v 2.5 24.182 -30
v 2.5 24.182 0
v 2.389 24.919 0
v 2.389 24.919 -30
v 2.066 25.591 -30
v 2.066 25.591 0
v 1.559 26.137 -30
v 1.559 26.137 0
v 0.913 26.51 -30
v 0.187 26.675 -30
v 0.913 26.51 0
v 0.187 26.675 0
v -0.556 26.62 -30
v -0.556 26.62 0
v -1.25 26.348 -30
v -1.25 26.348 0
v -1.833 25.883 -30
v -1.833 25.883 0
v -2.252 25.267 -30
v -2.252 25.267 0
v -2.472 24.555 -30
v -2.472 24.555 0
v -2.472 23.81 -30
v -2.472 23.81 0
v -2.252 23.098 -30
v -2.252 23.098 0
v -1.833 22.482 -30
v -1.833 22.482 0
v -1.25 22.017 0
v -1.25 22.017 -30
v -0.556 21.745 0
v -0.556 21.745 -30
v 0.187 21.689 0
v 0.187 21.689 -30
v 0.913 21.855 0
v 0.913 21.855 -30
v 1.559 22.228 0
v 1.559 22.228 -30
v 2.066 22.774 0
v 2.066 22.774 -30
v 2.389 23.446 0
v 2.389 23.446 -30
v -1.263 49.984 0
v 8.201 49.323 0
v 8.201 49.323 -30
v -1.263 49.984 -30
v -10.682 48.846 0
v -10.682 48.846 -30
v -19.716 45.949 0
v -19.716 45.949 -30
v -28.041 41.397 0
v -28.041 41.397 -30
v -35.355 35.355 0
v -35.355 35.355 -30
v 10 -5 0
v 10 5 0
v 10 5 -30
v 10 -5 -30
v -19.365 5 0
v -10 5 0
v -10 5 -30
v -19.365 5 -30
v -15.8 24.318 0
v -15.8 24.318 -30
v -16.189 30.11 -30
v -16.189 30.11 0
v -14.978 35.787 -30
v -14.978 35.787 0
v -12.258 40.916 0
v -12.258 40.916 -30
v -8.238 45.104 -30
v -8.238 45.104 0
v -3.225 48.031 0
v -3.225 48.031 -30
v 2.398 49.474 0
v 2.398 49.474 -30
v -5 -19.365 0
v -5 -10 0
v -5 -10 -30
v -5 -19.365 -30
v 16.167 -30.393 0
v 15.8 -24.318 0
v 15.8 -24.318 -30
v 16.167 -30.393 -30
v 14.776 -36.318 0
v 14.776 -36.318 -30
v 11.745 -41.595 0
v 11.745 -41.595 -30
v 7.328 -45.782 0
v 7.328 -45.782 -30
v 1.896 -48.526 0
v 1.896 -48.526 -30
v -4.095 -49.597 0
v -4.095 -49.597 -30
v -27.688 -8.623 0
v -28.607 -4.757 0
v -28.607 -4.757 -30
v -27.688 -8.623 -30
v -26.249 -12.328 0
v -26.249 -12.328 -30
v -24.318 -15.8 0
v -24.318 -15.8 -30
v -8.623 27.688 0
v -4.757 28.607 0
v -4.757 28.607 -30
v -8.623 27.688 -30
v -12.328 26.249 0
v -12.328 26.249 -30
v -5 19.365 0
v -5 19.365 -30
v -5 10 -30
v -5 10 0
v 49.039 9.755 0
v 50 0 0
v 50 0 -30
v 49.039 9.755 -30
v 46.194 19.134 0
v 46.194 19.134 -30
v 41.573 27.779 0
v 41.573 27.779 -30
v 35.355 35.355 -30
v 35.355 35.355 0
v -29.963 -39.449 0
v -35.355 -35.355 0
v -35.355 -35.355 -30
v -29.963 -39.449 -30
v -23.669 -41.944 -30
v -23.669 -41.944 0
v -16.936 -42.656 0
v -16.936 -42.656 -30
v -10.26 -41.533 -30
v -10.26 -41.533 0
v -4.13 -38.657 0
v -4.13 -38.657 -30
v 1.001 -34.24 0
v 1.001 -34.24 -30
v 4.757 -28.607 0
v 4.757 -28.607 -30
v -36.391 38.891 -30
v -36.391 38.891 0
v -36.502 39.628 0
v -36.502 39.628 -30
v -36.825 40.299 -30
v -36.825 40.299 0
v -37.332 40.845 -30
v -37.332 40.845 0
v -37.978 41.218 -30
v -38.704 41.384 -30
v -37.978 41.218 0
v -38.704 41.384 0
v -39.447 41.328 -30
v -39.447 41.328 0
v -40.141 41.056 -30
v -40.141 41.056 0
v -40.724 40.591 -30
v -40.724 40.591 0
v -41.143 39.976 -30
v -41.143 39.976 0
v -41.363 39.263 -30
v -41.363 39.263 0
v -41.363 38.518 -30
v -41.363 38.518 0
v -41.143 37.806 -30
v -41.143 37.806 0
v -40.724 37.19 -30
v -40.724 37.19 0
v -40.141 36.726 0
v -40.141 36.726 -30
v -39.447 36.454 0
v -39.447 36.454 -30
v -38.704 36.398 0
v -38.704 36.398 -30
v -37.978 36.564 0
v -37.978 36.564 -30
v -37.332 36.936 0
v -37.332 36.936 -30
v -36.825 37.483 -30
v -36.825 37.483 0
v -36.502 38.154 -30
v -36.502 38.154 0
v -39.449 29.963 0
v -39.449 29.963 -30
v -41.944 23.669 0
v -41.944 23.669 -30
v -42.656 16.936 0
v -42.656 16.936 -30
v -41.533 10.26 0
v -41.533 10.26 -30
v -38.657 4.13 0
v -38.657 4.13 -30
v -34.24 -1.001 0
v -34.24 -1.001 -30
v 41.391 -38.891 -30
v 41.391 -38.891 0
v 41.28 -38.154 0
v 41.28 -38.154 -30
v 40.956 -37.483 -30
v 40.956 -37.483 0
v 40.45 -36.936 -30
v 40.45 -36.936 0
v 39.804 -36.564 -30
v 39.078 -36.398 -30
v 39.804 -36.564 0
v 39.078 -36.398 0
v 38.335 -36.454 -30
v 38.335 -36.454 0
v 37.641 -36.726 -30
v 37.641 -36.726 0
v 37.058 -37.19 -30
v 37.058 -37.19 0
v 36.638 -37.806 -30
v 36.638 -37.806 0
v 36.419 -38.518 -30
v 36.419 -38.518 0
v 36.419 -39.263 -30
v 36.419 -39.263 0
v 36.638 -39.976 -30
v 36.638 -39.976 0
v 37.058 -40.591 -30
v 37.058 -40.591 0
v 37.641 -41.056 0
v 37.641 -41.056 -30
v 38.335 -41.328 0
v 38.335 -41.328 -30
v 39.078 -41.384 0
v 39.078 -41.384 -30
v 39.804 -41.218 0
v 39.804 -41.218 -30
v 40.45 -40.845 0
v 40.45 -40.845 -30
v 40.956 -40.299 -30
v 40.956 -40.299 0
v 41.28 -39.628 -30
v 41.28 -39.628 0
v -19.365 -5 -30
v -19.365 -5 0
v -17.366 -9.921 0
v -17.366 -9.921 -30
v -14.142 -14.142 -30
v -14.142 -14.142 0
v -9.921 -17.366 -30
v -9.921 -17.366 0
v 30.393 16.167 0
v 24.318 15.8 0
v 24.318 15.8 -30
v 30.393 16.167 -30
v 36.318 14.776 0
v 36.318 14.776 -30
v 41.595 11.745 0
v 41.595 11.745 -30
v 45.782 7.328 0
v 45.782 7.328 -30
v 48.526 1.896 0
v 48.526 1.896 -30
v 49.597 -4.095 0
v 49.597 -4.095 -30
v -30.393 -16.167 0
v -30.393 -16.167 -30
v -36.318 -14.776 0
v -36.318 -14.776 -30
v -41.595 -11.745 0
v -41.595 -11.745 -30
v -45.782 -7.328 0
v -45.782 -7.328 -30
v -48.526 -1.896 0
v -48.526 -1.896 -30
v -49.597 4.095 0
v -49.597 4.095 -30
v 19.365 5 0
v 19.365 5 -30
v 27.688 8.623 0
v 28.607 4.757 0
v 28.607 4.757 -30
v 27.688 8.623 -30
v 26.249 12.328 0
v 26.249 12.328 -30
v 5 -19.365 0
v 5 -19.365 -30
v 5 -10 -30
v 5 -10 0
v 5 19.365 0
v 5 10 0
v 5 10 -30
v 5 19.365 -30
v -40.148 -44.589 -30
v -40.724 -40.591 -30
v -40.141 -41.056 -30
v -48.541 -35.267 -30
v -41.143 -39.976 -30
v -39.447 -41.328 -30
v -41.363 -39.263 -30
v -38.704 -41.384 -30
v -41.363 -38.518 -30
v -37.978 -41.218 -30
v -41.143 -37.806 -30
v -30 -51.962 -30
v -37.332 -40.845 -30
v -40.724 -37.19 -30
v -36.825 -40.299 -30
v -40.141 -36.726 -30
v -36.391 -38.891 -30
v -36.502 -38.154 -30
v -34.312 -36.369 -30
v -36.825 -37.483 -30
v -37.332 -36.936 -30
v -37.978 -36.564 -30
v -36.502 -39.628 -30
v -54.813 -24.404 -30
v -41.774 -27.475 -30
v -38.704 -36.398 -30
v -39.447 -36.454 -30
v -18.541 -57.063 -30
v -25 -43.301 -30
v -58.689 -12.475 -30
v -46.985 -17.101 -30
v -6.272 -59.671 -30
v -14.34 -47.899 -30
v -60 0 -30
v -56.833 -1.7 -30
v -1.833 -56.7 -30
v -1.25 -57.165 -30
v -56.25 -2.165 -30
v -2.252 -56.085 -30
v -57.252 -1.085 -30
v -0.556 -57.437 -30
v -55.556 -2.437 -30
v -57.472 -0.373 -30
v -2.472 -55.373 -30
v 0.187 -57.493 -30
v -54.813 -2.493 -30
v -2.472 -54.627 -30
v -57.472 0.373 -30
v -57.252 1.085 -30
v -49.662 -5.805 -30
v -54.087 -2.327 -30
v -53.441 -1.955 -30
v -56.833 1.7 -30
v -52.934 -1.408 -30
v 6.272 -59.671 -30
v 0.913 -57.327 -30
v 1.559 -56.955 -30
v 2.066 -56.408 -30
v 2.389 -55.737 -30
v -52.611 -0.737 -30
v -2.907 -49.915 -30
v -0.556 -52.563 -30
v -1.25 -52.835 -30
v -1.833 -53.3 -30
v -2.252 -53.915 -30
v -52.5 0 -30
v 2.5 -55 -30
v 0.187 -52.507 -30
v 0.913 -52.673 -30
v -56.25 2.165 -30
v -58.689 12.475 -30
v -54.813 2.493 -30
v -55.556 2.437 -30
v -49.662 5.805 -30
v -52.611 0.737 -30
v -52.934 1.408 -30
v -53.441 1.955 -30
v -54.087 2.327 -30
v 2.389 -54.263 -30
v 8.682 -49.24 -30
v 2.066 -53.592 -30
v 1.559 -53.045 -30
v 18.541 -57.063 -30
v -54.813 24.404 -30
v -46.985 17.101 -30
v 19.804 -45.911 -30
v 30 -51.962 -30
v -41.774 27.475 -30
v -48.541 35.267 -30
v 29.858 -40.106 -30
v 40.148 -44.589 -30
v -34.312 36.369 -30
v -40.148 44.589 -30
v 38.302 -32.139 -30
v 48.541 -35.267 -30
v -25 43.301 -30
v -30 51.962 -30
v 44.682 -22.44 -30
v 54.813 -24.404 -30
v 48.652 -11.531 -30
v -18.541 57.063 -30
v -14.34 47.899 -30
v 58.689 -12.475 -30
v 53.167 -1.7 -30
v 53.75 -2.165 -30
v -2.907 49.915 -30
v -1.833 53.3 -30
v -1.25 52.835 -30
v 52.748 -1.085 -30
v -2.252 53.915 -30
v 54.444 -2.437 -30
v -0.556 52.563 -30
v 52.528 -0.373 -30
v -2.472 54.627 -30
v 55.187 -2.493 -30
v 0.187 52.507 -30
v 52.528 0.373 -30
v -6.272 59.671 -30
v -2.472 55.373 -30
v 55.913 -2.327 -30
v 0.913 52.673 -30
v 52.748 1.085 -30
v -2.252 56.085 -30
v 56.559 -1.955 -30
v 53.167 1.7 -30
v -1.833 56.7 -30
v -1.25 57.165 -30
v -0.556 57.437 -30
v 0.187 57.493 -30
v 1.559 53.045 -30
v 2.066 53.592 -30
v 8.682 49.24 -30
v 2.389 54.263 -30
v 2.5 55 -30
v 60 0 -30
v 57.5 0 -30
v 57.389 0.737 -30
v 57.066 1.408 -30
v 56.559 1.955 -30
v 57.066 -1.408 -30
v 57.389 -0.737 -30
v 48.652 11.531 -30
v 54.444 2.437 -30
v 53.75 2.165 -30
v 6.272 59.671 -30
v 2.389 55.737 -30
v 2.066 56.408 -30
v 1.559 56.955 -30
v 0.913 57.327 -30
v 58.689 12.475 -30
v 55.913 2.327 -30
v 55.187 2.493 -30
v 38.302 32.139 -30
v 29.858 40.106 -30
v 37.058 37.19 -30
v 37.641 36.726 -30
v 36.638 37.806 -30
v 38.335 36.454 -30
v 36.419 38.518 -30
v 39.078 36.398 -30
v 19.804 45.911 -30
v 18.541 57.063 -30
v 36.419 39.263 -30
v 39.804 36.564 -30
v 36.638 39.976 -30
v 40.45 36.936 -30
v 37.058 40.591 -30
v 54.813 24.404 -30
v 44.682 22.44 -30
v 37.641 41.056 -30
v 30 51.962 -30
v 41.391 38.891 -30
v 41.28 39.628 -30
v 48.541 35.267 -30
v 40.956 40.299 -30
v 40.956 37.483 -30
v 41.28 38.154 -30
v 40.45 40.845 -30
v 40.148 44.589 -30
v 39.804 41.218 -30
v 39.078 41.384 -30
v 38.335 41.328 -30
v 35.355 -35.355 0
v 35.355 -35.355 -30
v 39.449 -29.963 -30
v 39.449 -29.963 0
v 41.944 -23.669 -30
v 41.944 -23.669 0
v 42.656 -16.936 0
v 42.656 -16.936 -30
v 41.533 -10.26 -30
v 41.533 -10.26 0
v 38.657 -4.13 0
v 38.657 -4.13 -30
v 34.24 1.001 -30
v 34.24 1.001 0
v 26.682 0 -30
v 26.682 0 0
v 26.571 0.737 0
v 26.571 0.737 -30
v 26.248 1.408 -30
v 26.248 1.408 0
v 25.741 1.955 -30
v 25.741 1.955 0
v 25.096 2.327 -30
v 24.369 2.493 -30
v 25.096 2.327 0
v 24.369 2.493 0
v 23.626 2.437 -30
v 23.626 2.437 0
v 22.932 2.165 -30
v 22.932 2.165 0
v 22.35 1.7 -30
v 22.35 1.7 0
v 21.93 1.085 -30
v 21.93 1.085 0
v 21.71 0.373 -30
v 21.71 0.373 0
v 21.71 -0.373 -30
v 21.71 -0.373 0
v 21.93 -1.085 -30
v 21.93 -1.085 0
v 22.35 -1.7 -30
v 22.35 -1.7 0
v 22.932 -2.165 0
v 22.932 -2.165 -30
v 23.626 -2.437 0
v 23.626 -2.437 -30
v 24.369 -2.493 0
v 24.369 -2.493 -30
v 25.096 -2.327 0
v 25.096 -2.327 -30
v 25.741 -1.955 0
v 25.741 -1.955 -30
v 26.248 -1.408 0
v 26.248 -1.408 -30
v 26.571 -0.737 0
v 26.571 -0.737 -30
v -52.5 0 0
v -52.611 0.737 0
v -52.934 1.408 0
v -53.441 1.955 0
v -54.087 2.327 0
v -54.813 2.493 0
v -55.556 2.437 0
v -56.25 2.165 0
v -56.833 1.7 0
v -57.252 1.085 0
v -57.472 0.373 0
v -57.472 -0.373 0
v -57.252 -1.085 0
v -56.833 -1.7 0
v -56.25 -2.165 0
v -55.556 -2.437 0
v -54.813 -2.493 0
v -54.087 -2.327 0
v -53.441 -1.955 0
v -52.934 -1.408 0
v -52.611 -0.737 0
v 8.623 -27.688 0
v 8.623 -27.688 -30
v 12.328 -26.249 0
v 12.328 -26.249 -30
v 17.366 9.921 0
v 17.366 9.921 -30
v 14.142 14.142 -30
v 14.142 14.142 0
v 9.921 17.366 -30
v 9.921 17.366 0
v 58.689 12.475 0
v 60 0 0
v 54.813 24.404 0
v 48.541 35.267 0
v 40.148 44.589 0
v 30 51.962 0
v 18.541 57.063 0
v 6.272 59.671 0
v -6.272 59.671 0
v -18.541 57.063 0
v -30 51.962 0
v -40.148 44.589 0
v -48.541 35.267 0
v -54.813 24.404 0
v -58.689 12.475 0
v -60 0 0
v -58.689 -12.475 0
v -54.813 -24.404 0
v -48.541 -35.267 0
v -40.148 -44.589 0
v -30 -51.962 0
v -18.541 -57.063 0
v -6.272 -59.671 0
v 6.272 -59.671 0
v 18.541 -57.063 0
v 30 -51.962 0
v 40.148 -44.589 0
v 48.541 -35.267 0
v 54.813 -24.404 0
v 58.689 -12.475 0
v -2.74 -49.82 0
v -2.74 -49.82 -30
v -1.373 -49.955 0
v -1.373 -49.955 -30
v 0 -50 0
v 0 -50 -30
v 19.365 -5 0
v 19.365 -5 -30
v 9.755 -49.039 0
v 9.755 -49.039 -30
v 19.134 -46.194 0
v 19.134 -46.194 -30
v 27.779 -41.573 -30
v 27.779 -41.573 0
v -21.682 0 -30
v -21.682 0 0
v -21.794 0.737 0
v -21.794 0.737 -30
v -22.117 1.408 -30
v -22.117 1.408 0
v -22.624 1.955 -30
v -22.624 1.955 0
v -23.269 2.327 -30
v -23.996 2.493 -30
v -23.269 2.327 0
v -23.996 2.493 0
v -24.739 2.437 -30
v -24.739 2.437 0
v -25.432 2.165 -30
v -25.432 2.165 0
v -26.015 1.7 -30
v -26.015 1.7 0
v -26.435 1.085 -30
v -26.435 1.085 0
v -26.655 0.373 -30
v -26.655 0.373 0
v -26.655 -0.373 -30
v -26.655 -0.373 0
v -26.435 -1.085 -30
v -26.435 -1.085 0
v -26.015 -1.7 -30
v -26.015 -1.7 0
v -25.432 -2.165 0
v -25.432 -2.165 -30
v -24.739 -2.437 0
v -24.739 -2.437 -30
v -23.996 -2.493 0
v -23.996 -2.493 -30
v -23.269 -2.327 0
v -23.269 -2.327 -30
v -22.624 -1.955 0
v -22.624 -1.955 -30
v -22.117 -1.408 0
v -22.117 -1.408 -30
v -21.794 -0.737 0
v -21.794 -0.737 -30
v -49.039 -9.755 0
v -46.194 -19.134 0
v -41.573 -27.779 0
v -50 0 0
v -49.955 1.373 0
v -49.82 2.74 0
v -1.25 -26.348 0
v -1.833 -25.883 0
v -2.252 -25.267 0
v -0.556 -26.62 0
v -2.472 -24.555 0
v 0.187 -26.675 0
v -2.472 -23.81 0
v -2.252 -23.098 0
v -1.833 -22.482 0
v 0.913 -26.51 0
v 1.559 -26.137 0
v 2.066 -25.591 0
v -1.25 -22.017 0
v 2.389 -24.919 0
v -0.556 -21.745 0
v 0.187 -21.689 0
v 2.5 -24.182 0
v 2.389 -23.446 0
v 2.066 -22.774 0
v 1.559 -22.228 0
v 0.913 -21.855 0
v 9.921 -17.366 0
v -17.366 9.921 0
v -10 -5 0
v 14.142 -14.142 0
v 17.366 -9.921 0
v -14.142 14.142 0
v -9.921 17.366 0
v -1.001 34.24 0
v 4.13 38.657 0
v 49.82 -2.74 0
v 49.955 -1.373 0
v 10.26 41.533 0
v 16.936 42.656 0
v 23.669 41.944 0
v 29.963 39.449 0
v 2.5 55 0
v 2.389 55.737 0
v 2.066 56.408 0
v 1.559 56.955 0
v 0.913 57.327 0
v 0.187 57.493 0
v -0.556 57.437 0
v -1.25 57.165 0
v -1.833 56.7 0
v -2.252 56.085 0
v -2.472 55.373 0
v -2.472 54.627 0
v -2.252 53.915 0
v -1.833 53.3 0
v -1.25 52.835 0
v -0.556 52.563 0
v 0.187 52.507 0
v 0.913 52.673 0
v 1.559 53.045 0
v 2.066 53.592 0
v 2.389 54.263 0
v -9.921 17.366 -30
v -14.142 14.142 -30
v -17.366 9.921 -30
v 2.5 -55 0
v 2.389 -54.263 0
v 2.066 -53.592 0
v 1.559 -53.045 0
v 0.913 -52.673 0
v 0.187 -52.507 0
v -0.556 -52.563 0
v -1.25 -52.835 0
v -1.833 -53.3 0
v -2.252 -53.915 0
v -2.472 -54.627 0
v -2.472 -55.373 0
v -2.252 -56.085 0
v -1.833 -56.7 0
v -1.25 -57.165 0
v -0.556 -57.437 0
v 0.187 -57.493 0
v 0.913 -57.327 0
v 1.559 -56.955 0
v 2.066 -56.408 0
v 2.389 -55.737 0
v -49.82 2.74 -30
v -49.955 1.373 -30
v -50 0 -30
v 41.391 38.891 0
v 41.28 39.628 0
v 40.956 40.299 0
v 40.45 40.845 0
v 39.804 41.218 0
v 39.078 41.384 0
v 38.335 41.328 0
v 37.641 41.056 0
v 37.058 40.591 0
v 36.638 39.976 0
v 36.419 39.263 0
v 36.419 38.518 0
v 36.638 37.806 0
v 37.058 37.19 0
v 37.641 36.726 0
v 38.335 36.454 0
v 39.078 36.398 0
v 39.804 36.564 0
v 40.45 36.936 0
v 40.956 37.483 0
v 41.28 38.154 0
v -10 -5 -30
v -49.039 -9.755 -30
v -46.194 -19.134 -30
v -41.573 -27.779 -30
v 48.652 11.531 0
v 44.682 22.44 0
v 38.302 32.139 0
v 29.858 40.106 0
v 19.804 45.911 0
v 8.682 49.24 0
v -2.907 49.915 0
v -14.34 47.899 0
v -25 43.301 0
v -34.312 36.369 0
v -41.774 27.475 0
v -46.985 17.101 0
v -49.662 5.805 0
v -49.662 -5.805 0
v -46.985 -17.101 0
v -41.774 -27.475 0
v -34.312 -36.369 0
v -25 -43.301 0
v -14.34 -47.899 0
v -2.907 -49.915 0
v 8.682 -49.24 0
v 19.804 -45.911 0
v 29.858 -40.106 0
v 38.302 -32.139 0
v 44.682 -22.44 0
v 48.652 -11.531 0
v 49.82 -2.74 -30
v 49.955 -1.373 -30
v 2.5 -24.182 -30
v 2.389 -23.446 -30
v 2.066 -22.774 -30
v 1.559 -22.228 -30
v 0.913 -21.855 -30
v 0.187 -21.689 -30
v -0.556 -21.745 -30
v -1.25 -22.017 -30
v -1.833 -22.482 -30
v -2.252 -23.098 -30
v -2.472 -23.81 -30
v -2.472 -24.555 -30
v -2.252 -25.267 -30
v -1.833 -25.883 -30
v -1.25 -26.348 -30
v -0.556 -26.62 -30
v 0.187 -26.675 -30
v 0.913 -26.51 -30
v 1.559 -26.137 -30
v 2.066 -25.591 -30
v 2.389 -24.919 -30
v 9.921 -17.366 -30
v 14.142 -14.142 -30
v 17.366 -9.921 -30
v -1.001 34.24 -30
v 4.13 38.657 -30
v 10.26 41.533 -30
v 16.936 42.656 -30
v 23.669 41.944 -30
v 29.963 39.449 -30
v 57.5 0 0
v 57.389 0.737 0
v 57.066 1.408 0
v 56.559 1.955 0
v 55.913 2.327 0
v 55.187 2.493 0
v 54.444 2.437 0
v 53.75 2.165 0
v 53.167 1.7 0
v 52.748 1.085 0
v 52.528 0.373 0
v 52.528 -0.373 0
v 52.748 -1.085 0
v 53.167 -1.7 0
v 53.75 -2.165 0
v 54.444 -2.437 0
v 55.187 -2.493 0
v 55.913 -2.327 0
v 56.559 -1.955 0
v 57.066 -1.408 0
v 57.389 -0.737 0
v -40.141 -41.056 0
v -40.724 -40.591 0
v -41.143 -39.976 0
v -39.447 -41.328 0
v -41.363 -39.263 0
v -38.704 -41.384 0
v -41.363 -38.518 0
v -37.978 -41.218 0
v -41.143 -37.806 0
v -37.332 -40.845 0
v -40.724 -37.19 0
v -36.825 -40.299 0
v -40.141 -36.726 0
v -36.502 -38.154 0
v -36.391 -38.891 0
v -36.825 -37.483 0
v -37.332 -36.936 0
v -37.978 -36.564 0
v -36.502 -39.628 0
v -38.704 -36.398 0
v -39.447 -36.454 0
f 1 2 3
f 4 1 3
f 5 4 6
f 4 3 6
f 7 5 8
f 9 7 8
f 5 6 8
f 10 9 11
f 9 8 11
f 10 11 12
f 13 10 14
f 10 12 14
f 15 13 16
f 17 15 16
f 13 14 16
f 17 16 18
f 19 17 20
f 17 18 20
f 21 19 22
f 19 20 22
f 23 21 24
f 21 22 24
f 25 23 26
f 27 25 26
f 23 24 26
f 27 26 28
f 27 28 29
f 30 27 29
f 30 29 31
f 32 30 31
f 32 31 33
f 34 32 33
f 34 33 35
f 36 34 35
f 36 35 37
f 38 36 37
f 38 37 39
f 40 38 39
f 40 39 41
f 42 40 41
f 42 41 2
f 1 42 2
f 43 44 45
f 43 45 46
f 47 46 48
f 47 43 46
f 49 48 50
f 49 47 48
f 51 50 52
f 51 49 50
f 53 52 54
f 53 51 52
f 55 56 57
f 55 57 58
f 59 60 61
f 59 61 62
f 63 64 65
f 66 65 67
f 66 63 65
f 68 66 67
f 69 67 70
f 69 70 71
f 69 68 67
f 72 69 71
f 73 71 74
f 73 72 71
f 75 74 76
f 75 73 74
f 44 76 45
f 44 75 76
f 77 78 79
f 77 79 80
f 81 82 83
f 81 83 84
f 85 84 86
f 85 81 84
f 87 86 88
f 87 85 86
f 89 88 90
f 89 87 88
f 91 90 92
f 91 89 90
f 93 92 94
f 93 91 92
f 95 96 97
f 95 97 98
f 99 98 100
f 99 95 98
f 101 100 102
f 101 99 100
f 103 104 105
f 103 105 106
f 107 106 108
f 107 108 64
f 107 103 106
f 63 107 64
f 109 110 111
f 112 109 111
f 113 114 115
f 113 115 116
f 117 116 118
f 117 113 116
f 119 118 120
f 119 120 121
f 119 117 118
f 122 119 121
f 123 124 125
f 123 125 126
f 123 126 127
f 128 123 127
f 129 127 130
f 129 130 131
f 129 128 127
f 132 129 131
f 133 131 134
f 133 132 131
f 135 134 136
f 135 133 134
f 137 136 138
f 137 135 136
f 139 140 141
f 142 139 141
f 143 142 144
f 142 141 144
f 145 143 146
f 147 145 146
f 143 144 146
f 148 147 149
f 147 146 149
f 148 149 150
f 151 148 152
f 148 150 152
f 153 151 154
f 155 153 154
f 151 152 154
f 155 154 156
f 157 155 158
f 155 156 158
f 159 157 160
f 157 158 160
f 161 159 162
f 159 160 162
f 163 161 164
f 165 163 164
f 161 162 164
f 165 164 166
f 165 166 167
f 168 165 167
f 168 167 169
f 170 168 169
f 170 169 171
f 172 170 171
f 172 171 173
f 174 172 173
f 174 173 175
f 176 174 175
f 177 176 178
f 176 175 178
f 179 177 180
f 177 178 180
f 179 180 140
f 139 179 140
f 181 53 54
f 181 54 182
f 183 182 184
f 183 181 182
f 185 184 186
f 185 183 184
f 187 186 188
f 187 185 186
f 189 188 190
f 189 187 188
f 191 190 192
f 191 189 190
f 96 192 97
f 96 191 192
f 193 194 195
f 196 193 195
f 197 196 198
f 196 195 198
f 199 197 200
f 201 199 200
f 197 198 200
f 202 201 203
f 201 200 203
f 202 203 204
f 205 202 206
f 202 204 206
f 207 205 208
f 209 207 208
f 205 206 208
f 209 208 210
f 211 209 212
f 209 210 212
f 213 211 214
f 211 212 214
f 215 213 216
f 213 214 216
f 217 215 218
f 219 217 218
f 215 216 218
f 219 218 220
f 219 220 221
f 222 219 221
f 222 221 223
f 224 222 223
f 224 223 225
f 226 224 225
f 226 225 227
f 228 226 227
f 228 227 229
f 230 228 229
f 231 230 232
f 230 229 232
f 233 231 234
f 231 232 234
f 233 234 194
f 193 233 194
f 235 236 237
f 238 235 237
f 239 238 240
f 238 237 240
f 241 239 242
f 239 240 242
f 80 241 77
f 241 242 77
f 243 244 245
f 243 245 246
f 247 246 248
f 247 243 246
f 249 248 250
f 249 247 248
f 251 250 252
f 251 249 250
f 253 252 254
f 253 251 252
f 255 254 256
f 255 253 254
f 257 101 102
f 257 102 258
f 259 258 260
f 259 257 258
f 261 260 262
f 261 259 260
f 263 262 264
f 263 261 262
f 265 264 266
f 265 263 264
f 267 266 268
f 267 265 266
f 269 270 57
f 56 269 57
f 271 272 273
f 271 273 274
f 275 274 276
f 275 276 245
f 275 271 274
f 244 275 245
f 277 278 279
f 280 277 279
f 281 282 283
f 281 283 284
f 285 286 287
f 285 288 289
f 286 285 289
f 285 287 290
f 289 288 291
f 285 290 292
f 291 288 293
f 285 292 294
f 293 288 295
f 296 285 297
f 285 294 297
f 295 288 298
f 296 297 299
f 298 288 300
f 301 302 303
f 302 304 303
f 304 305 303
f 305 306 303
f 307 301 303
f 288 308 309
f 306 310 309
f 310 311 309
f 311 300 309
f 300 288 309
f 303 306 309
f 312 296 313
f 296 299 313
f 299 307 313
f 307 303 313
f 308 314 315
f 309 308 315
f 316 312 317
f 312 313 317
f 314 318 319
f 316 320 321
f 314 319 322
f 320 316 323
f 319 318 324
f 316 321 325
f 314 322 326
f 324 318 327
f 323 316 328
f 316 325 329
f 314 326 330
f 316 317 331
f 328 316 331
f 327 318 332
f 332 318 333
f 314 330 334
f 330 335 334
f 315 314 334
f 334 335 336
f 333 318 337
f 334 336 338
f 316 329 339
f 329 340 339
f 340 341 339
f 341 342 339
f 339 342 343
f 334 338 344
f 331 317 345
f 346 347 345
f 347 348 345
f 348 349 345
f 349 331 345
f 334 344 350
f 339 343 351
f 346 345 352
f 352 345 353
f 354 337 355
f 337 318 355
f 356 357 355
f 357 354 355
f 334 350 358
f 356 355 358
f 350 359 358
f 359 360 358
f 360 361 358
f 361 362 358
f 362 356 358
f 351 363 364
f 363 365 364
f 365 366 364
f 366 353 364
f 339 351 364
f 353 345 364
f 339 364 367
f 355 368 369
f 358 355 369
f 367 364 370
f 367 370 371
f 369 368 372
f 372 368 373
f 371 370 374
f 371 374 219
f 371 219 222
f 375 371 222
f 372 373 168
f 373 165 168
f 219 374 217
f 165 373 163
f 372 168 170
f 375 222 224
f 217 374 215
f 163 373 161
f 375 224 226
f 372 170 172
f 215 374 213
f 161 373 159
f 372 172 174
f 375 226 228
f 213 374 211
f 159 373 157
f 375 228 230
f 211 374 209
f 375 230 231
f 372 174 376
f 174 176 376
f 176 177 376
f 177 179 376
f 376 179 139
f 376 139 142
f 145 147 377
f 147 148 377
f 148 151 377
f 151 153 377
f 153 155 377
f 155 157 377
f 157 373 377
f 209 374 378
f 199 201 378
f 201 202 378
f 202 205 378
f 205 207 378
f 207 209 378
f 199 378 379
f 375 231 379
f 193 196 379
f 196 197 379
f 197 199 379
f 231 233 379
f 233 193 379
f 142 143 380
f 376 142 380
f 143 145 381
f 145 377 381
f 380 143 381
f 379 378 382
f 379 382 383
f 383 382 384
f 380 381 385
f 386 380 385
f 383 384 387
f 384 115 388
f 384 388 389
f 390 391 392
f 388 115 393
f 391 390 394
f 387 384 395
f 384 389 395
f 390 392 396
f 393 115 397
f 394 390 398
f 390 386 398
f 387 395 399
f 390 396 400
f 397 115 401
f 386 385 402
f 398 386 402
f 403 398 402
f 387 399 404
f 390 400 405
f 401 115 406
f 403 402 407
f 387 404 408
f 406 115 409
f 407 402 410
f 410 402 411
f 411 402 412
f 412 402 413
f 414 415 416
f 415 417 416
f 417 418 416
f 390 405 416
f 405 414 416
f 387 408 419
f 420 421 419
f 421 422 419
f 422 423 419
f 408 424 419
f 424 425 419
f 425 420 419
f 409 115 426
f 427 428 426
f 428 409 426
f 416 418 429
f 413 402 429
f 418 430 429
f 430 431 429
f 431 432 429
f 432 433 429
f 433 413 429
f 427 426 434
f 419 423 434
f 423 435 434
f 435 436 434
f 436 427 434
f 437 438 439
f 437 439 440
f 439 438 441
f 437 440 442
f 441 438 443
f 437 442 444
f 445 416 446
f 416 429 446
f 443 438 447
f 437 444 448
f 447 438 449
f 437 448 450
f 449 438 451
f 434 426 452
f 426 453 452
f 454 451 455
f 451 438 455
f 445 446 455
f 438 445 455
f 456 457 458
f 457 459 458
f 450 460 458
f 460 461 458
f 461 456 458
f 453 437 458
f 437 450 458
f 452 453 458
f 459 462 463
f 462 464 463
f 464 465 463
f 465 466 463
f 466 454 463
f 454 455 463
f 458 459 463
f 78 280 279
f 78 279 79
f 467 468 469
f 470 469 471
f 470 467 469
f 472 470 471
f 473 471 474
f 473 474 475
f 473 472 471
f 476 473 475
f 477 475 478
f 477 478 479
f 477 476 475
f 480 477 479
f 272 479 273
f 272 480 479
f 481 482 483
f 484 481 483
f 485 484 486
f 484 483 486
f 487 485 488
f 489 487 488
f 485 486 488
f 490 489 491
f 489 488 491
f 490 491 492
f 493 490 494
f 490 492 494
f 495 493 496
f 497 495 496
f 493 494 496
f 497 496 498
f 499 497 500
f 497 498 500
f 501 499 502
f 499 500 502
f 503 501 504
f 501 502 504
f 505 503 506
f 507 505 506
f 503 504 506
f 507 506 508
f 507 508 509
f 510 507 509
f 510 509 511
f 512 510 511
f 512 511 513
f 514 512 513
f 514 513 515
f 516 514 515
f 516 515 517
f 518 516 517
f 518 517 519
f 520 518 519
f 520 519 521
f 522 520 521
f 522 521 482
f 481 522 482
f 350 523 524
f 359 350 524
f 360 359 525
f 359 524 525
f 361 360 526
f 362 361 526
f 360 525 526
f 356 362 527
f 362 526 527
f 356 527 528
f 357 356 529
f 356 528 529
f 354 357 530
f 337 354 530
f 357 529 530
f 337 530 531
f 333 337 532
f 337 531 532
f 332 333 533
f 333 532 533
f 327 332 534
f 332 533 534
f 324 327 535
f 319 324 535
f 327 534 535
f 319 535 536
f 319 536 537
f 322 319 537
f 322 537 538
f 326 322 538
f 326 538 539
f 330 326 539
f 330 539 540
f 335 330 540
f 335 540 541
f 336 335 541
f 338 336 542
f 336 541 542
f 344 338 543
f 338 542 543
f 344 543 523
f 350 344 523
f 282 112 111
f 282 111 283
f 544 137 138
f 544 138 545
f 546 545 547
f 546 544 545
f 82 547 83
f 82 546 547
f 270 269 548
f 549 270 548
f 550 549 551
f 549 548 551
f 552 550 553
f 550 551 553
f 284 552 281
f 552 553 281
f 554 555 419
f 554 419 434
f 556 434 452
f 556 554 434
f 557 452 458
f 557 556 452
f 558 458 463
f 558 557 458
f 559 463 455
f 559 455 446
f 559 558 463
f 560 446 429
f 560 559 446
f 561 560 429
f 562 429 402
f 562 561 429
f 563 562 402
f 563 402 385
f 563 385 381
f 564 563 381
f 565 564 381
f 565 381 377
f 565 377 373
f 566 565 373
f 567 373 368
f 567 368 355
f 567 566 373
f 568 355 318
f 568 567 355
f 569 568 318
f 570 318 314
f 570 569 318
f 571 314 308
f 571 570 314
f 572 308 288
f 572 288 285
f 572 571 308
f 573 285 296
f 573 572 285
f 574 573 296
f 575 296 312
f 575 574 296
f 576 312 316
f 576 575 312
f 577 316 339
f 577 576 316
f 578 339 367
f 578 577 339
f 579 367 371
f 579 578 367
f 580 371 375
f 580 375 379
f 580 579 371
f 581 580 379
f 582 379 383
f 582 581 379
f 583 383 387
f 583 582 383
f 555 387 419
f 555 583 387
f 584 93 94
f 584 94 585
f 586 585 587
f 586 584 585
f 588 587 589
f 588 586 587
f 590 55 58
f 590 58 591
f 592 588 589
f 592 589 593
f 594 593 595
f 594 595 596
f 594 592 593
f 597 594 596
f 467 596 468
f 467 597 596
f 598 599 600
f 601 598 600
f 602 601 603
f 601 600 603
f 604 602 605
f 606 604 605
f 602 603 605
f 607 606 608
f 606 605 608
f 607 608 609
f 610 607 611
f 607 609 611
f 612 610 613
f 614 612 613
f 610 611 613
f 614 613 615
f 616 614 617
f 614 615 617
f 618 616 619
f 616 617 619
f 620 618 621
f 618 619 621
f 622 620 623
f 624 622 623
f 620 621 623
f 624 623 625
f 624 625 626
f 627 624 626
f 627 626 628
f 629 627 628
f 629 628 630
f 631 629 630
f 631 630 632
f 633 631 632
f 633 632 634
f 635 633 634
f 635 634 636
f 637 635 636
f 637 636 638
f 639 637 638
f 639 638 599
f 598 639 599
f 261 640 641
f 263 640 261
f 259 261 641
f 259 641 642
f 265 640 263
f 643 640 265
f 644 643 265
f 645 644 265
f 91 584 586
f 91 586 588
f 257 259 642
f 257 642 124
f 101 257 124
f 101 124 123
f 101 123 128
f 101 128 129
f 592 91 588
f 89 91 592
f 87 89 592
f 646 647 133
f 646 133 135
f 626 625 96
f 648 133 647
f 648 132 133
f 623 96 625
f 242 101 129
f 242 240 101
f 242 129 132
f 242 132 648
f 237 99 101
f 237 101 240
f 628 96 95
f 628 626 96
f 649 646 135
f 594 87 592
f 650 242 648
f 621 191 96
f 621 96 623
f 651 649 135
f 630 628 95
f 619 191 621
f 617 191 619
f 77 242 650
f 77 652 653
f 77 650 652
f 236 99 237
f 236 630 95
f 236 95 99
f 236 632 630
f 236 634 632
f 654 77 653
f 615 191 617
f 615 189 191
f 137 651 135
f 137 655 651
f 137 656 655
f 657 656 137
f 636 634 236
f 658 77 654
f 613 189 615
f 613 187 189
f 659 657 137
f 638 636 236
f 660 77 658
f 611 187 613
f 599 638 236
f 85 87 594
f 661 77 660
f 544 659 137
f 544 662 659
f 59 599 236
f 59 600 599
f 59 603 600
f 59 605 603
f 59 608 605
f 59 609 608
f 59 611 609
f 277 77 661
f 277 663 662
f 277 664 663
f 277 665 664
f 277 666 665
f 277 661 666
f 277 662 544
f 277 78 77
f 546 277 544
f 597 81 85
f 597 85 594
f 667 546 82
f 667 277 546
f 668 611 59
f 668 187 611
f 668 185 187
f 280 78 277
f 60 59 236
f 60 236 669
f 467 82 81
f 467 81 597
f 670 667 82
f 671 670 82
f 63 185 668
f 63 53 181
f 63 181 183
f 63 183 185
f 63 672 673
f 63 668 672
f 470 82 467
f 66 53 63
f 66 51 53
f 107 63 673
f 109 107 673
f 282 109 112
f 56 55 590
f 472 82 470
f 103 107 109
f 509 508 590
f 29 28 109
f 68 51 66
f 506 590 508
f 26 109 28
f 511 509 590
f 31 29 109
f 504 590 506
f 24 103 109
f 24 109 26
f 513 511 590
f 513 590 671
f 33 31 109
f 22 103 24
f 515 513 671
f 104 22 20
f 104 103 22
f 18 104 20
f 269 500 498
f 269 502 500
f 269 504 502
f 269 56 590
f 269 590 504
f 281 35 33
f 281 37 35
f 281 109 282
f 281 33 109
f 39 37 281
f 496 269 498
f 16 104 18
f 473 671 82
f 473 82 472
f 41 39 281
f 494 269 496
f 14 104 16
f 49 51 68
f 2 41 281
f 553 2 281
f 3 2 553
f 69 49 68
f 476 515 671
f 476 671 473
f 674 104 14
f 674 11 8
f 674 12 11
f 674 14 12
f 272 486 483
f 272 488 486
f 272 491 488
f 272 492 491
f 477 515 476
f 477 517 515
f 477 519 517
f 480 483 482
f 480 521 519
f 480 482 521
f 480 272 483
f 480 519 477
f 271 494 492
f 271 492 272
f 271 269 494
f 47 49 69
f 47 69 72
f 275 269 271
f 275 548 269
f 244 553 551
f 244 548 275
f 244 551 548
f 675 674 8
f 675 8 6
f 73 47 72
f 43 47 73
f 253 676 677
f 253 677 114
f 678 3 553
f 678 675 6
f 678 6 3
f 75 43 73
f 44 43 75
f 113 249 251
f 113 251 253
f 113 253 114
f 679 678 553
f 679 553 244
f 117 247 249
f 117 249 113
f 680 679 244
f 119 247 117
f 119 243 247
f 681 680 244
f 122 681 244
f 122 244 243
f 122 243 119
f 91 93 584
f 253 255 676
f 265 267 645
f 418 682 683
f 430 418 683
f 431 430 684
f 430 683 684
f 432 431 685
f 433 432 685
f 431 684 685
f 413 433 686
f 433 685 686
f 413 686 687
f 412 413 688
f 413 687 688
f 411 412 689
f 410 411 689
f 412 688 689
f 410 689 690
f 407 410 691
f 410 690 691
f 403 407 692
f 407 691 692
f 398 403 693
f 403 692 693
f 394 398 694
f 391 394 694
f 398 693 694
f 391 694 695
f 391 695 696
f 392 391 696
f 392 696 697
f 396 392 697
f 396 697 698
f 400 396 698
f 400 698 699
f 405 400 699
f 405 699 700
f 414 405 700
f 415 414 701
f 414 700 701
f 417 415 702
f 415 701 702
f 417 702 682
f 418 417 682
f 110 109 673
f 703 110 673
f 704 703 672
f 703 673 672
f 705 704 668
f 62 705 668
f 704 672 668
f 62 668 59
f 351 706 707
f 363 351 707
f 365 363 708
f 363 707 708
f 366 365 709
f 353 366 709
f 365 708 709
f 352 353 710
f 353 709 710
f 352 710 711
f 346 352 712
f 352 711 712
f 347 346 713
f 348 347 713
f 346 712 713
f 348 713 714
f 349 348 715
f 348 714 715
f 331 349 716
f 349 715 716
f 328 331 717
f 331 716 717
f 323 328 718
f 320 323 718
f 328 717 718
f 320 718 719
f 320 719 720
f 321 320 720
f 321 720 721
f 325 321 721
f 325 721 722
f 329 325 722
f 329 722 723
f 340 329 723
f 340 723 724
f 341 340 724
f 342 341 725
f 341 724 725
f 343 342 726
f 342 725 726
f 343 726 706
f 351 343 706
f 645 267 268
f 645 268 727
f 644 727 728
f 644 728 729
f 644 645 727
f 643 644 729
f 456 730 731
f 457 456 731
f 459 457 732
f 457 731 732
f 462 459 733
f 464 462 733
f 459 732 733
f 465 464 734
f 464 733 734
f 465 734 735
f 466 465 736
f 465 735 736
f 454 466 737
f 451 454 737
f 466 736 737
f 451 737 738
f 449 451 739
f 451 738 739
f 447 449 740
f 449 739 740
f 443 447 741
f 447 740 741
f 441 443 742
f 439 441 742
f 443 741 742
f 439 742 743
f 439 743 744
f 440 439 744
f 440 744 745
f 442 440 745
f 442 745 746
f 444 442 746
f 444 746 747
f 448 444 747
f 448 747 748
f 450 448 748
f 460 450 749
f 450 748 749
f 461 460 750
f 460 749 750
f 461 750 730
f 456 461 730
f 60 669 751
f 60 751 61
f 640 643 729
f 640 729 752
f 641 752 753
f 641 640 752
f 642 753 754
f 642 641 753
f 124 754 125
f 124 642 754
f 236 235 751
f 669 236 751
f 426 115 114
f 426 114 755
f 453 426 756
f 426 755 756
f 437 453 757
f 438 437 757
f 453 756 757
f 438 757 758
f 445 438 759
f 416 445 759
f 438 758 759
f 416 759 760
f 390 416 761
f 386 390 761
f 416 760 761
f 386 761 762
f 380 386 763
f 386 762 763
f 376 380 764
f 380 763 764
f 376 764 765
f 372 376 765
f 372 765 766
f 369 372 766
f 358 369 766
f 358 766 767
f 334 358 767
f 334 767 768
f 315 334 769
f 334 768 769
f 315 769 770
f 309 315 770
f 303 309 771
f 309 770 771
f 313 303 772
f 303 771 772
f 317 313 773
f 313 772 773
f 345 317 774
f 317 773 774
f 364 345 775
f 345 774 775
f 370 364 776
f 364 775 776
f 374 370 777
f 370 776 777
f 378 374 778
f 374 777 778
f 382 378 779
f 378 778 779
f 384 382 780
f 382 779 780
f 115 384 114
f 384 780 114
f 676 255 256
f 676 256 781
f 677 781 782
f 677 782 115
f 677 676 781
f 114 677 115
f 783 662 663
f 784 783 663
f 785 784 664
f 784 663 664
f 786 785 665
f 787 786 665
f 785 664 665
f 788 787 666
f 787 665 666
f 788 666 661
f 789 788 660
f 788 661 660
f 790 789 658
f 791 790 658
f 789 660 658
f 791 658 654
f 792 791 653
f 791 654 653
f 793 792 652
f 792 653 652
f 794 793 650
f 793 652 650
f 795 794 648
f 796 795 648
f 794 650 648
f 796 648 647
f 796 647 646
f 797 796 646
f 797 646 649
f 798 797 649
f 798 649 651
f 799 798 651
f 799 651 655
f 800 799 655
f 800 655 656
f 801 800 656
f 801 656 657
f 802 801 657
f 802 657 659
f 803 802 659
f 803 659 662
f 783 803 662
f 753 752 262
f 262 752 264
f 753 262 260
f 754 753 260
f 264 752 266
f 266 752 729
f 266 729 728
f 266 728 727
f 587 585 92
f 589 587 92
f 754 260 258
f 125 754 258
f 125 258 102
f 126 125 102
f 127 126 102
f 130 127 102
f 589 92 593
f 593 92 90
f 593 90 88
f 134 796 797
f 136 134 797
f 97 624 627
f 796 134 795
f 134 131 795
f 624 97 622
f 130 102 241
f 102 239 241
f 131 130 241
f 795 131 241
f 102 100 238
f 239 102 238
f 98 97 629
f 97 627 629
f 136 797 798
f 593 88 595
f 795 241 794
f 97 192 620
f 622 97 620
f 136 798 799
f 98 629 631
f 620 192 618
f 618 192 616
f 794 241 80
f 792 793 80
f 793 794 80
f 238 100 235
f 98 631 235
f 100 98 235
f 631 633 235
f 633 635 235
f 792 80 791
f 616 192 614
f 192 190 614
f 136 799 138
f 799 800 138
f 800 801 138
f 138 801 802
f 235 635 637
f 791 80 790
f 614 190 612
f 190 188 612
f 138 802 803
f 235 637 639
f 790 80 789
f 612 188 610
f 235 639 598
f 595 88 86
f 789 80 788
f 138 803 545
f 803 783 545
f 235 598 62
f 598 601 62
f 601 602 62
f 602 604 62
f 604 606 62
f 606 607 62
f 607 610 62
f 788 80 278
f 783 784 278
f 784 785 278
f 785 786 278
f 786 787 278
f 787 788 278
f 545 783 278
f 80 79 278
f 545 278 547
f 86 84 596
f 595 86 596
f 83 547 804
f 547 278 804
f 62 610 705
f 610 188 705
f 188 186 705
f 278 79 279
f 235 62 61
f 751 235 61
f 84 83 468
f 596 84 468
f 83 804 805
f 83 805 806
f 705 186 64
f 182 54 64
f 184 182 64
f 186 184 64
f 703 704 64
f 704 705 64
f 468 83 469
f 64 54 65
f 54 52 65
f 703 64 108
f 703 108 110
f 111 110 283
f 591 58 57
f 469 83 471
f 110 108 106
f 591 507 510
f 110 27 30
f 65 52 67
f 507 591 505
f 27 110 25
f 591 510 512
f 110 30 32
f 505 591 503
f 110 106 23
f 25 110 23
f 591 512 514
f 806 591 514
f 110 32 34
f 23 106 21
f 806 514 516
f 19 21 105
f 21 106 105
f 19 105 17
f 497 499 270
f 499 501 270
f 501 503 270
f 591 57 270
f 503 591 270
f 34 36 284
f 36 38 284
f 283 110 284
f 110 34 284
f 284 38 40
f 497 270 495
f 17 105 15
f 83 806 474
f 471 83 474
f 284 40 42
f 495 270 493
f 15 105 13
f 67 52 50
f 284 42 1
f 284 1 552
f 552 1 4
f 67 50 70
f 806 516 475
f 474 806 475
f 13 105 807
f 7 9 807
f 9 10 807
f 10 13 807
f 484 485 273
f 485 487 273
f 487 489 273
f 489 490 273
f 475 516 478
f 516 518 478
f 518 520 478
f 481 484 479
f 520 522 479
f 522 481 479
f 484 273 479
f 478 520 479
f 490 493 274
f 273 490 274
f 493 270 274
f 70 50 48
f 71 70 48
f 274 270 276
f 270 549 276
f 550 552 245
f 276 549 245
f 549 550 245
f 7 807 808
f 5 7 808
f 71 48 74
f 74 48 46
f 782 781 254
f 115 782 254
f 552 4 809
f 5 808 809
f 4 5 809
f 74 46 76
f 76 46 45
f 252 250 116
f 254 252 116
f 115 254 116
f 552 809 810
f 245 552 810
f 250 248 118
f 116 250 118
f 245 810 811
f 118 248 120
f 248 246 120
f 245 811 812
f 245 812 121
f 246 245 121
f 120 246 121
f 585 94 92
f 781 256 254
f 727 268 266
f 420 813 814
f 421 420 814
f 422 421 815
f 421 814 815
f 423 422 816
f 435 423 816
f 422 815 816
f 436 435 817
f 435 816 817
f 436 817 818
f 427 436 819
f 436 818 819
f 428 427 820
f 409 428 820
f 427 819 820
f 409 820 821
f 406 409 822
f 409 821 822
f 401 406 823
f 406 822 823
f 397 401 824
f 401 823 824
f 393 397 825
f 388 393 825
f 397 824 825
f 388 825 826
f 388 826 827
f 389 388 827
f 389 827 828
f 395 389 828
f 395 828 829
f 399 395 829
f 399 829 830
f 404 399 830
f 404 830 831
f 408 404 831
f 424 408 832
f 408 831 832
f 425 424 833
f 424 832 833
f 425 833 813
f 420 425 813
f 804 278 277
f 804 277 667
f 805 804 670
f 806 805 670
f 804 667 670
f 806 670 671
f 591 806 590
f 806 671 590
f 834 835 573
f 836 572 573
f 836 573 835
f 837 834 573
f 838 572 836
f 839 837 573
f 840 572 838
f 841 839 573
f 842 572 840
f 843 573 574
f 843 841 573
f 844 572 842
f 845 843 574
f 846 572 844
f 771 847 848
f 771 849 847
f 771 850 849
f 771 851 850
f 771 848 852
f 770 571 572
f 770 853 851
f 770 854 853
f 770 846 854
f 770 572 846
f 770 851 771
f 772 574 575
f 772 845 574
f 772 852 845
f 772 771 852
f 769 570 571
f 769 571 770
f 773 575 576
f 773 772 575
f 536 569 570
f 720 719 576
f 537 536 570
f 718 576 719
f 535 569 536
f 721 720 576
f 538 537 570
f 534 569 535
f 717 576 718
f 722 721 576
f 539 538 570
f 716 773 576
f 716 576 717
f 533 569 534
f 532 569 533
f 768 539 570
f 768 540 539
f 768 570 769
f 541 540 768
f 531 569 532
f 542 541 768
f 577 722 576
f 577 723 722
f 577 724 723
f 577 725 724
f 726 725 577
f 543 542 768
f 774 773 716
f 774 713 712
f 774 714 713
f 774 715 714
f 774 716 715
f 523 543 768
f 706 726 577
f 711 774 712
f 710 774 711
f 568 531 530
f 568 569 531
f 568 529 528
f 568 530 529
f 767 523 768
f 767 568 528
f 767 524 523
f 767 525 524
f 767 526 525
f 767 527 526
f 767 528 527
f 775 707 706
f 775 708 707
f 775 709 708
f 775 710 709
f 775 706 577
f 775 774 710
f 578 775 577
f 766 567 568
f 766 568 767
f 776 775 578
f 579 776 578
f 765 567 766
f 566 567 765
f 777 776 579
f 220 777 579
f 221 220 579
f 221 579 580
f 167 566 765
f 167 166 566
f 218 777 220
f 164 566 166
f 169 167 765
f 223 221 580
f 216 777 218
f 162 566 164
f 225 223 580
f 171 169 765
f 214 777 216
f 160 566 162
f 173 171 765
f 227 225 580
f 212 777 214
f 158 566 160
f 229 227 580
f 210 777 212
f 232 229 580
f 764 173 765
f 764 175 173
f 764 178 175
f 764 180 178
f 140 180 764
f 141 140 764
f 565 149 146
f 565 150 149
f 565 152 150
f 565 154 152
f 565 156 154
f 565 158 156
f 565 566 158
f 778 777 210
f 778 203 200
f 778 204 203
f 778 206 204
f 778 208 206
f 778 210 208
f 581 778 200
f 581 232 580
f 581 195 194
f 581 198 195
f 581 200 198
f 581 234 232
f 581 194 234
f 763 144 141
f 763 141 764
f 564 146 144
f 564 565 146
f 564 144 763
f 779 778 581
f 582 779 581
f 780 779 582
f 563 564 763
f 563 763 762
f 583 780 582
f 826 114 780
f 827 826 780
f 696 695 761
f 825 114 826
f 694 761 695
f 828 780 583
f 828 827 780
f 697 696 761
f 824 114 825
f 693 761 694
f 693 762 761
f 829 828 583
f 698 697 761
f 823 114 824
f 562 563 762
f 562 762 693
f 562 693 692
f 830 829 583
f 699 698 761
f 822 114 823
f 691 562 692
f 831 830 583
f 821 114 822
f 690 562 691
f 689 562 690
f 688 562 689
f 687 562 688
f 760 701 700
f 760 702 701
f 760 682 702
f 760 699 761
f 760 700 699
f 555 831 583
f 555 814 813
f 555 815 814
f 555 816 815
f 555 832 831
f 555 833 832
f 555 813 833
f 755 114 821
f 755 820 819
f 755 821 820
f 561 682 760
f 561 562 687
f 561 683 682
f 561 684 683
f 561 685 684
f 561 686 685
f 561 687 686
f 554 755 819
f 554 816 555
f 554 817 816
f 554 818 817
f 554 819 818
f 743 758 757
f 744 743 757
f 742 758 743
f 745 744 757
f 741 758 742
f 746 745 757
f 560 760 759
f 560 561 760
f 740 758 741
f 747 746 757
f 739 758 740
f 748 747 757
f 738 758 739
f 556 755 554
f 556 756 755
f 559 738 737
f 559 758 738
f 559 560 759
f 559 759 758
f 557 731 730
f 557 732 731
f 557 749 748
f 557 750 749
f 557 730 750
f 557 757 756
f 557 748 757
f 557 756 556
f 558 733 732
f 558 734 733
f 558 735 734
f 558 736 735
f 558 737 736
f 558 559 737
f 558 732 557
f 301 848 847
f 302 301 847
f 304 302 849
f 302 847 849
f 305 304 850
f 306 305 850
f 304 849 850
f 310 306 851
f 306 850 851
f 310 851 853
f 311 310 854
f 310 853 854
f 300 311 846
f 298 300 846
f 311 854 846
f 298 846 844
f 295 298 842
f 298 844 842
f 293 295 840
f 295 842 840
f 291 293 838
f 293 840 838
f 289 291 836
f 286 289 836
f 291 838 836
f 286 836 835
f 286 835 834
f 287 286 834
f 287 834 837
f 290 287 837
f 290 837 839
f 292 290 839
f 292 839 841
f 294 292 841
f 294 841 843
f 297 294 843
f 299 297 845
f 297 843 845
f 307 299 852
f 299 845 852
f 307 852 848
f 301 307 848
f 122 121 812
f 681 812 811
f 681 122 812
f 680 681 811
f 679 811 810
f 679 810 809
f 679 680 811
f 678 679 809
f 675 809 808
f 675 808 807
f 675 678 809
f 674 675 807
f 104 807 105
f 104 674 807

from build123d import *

# Parameters (mm, degrees)
SKETCH6_R                 = 29
SKETCH6_R_2               = 20
INNER_RING_DEPTH          = 30
MOTOR_CONNECTOR_CUT_DEPTH = 30
SKETCH8_R                 = 2.5
M3_HOLES_DEPTH            = 38
M3_HOLES_DEPTH_BACK       = 100
MIDDLE_PATTERN_DEPTH      = 30
SKETCH9_R                 = 60
SKETCH9_R_2               = 50
SKETCH9_R_3               = 2.5
BOSS_EXTRUDE1_DEPTH       = 30


with BuildPart() as part:
    # Sketch6 → Inner Ring (new body)
    with BuildSketch(Plane.XY):
        Circle(SKETCH6_R)
        Circle(SKETCH6_R_2, mode=Mode.SUBTRACT)
    extrude(amount=-INNER_RING_DEPTH)

    # Sketch7 → Motor Connector Cut (add)
    with BuildSketch(Plane.XY):
        with BuildLine():
            ThreePointArc((20, 0), (19.840593925, 2.52008585), (19.364916731, 5))
            Line((19.364916731, 5), (9.999996731, 5))
            Line((9.999996731, 5), (9.999996731, -5))
            Line((9.999996731, -5), (19.364916731, -5))
            ThreePointArc((19.364916731, -5), (19.840593925, -2.52008585), (20, 0))
        make_face()
        with BuildLine():
            ThreePointArc((5, 19.364916731), (0, 20), (-5, 19.364916731))
            Line((-5, 19.364916731), (-5, 9.999996731))
            Line((-5, 9.999996731), (5, 9.999996731))
            Line((5, 9.999996731), (5, 19.364916731))
        make_face()
        with BuildLine():
            Line((-9.999996731, -5), (-9.999996731, 5))
            Line((-9.999996731, 5), (-19.364916731, 5))
            ThreePointArc((-19.364916731, 5), (-20, 0), (-19.364916731, -5))
            Line((-19.364916731, -5), (-9.999996731, -5))
        make_face()
        with BuildLine():
            Line((-5, -9.999996731), (-5, -19.364916731))
            ThreePointArc((-5, -19.364916731), (0, -20), (5, -19.364916731))
            Line((5, -19.364916731), (5, -9.999996731))
            Line((5, -9.999996731), (-5, -9.999996731))
        make_face()
    extrude(amount=-MOTOR_CONNECTOR_CUT_DEPTH)

    # Sketch8 → M3 Holes (cut, two sides)
    with BuildSketch(Plane.XY) as m3_holes_sk:
        with Locations((0, 24.182458366)):
            Circle(SKETCH8_R)
        with Locations((24.182458366, 0)):
            Circle(SKETCH8_R)
        with Locations((0, -24.182458366)):
            Circle(SKETCH8_R)
        with Locations((-24.182458366, 0)):
            Circle(SKETCH8_R)
    extrude(amount=M3_HOLES_DEPTH, mode=Mode.SUBTRACT)
    extrude(m3_holes_sk.sketch, amount=-M3_HOLES_DEPTH_BACK, mode=Mode.SUBTRACT)

    # Sketch10 → Middle Pattern (add)
    with BuildSketch(Plane.XY):
        with BuildLine():
            ThreePointArc((28.607215414, 4.756808408), (26.539406056, -11.690163651), (15.800414568, -24.317625284))
            ThreePointArc((15.800414568, -24.317625284), (11.745224483, -41.595013937), (-4.095362954, -49.596795923))
            ThreePointArc((-4.095362954, -49.596795923), (-2.057581903, -49.898955876), (-2.31e-07, -50))
            ThreePointArc((-2.31e-07, -50), (19.134171511, -46.19397667), (35.355339059, -35.355339059))
            ThreePointArc((35.355339059, -35.355339059), (42.321804958, -13.559663633), (28.607215414, 4.756808408))
        make_face()
        with BuildLine():
            ThreePointArc((24.317625284, 15.800414568), (41.595013937, 11.745224483), (49.596795923, -4.095362954))
            ThreePointArc((49.596795923, -4.095362954), (49.898955887, -2.057581788), (50, 0))
            ThreePointArc((50, 0), (46.193976626, 19.134171618), (35.355339059, 35.355339059))
            ThreePointArc((35.355339059, 35.355339059), (13.559663633, 42.321804958), (-4.756808408, 28.607215414))
            ThreePointArc((-4.756808408, 28.607215414), (11.690163651, 26.539406056), (24.317625284, 15.800414568))
        make_face()
        with BuildLine():
            ThreePointArc((8.201394106, 49.322785148), (-15.267827902, 47.611904301), (-35.355339044, 35.355339075))
            ThreePointArc((-35.355339044, 35.355339075), (-42.32180496, 13.559663644), (-28.607215414, -4.756808408))
            ThreePointArc((-28.607215414, -4.756808408), (-26.539406056, 11.690163651), (-15.800414568, 24.317625284))
            ThreePointArc((-15.800414568, 24.317625284), (-10.393277189, 43.149392225), (8.201394106, 49.322785148))
        make_face()
        with BuildLine():
            ThreePointArc((4.756808408, -28.607215414), (-11.690163651, -26.539406056), (-24.317625284, -15.800414568))
            ThreePointArc((-24.317625284, -15.800414568), (-41.595013937, -11.745224483), (-49.596795923, 4.095362954))
            ThreePointArc((-49.596795923, 4.095362954), (-49.898955887, 2.057581788), (-50, 0))
            ThreePointArc((-50, 0), (-46.193976566, -19.134171762), (-35.355338839, -35.35533928))
            ThreePointArc((-35.355338839, -35.35533928), (-13.559663479, -42.321804932), (4.756808408, -28.607215414))
        make_face()
    extrude(amount=-MIDDLE_PATTERN_DEPTH)


with BuildPart() as body_2:
    # Sketch9 → Boss-Extrude1 (new body)
    with BuildSketch(Plane.XY):
        Circle(SKETCH9_R)
        Circle(SKETCH9_R_2, mode=Mode.SUBTRACT)
        with Locations((0, 55)):
            Circle(SKETCH9_R_3, mode=Mode.SUBTRACT)
        with Locations((-38.890872965, 38.890872965)):
            Circle(SKETCH9_R_3, mode=Mode.SUBTRACT)
        with Locations((-55, 0)):
            Circle(SKETCH9_R_3, mode=Mode.SUBTRACT)
        with Locations((-38.890872965, -38.890872965)):
            Circle(SKETCH9_R_3, mode=Mode.SUBTRACT)
        with Locations((0, -55)):
            Circle(SKETCH9_R_3, mode=Mode.SUBTRACT)
        with Locations((38.890872965, -38.890872965)):
            Circle(SKETCH9_R_3, mode=Mode.SUBTRACT)
        with Locations((55, 0)):
            Circle(SKETCH9_R_3, mode=Mode.SUBTRACT)
        with Locations((38.890872965, 38.890872965)):
            Circle(SKETCH9_R_3, mode=Mode.SUBTRACT)
    extrude(amount=-BOSS_EXTRUDE1_DEPTH)


solid = Compound([part.part, body_2.part])
